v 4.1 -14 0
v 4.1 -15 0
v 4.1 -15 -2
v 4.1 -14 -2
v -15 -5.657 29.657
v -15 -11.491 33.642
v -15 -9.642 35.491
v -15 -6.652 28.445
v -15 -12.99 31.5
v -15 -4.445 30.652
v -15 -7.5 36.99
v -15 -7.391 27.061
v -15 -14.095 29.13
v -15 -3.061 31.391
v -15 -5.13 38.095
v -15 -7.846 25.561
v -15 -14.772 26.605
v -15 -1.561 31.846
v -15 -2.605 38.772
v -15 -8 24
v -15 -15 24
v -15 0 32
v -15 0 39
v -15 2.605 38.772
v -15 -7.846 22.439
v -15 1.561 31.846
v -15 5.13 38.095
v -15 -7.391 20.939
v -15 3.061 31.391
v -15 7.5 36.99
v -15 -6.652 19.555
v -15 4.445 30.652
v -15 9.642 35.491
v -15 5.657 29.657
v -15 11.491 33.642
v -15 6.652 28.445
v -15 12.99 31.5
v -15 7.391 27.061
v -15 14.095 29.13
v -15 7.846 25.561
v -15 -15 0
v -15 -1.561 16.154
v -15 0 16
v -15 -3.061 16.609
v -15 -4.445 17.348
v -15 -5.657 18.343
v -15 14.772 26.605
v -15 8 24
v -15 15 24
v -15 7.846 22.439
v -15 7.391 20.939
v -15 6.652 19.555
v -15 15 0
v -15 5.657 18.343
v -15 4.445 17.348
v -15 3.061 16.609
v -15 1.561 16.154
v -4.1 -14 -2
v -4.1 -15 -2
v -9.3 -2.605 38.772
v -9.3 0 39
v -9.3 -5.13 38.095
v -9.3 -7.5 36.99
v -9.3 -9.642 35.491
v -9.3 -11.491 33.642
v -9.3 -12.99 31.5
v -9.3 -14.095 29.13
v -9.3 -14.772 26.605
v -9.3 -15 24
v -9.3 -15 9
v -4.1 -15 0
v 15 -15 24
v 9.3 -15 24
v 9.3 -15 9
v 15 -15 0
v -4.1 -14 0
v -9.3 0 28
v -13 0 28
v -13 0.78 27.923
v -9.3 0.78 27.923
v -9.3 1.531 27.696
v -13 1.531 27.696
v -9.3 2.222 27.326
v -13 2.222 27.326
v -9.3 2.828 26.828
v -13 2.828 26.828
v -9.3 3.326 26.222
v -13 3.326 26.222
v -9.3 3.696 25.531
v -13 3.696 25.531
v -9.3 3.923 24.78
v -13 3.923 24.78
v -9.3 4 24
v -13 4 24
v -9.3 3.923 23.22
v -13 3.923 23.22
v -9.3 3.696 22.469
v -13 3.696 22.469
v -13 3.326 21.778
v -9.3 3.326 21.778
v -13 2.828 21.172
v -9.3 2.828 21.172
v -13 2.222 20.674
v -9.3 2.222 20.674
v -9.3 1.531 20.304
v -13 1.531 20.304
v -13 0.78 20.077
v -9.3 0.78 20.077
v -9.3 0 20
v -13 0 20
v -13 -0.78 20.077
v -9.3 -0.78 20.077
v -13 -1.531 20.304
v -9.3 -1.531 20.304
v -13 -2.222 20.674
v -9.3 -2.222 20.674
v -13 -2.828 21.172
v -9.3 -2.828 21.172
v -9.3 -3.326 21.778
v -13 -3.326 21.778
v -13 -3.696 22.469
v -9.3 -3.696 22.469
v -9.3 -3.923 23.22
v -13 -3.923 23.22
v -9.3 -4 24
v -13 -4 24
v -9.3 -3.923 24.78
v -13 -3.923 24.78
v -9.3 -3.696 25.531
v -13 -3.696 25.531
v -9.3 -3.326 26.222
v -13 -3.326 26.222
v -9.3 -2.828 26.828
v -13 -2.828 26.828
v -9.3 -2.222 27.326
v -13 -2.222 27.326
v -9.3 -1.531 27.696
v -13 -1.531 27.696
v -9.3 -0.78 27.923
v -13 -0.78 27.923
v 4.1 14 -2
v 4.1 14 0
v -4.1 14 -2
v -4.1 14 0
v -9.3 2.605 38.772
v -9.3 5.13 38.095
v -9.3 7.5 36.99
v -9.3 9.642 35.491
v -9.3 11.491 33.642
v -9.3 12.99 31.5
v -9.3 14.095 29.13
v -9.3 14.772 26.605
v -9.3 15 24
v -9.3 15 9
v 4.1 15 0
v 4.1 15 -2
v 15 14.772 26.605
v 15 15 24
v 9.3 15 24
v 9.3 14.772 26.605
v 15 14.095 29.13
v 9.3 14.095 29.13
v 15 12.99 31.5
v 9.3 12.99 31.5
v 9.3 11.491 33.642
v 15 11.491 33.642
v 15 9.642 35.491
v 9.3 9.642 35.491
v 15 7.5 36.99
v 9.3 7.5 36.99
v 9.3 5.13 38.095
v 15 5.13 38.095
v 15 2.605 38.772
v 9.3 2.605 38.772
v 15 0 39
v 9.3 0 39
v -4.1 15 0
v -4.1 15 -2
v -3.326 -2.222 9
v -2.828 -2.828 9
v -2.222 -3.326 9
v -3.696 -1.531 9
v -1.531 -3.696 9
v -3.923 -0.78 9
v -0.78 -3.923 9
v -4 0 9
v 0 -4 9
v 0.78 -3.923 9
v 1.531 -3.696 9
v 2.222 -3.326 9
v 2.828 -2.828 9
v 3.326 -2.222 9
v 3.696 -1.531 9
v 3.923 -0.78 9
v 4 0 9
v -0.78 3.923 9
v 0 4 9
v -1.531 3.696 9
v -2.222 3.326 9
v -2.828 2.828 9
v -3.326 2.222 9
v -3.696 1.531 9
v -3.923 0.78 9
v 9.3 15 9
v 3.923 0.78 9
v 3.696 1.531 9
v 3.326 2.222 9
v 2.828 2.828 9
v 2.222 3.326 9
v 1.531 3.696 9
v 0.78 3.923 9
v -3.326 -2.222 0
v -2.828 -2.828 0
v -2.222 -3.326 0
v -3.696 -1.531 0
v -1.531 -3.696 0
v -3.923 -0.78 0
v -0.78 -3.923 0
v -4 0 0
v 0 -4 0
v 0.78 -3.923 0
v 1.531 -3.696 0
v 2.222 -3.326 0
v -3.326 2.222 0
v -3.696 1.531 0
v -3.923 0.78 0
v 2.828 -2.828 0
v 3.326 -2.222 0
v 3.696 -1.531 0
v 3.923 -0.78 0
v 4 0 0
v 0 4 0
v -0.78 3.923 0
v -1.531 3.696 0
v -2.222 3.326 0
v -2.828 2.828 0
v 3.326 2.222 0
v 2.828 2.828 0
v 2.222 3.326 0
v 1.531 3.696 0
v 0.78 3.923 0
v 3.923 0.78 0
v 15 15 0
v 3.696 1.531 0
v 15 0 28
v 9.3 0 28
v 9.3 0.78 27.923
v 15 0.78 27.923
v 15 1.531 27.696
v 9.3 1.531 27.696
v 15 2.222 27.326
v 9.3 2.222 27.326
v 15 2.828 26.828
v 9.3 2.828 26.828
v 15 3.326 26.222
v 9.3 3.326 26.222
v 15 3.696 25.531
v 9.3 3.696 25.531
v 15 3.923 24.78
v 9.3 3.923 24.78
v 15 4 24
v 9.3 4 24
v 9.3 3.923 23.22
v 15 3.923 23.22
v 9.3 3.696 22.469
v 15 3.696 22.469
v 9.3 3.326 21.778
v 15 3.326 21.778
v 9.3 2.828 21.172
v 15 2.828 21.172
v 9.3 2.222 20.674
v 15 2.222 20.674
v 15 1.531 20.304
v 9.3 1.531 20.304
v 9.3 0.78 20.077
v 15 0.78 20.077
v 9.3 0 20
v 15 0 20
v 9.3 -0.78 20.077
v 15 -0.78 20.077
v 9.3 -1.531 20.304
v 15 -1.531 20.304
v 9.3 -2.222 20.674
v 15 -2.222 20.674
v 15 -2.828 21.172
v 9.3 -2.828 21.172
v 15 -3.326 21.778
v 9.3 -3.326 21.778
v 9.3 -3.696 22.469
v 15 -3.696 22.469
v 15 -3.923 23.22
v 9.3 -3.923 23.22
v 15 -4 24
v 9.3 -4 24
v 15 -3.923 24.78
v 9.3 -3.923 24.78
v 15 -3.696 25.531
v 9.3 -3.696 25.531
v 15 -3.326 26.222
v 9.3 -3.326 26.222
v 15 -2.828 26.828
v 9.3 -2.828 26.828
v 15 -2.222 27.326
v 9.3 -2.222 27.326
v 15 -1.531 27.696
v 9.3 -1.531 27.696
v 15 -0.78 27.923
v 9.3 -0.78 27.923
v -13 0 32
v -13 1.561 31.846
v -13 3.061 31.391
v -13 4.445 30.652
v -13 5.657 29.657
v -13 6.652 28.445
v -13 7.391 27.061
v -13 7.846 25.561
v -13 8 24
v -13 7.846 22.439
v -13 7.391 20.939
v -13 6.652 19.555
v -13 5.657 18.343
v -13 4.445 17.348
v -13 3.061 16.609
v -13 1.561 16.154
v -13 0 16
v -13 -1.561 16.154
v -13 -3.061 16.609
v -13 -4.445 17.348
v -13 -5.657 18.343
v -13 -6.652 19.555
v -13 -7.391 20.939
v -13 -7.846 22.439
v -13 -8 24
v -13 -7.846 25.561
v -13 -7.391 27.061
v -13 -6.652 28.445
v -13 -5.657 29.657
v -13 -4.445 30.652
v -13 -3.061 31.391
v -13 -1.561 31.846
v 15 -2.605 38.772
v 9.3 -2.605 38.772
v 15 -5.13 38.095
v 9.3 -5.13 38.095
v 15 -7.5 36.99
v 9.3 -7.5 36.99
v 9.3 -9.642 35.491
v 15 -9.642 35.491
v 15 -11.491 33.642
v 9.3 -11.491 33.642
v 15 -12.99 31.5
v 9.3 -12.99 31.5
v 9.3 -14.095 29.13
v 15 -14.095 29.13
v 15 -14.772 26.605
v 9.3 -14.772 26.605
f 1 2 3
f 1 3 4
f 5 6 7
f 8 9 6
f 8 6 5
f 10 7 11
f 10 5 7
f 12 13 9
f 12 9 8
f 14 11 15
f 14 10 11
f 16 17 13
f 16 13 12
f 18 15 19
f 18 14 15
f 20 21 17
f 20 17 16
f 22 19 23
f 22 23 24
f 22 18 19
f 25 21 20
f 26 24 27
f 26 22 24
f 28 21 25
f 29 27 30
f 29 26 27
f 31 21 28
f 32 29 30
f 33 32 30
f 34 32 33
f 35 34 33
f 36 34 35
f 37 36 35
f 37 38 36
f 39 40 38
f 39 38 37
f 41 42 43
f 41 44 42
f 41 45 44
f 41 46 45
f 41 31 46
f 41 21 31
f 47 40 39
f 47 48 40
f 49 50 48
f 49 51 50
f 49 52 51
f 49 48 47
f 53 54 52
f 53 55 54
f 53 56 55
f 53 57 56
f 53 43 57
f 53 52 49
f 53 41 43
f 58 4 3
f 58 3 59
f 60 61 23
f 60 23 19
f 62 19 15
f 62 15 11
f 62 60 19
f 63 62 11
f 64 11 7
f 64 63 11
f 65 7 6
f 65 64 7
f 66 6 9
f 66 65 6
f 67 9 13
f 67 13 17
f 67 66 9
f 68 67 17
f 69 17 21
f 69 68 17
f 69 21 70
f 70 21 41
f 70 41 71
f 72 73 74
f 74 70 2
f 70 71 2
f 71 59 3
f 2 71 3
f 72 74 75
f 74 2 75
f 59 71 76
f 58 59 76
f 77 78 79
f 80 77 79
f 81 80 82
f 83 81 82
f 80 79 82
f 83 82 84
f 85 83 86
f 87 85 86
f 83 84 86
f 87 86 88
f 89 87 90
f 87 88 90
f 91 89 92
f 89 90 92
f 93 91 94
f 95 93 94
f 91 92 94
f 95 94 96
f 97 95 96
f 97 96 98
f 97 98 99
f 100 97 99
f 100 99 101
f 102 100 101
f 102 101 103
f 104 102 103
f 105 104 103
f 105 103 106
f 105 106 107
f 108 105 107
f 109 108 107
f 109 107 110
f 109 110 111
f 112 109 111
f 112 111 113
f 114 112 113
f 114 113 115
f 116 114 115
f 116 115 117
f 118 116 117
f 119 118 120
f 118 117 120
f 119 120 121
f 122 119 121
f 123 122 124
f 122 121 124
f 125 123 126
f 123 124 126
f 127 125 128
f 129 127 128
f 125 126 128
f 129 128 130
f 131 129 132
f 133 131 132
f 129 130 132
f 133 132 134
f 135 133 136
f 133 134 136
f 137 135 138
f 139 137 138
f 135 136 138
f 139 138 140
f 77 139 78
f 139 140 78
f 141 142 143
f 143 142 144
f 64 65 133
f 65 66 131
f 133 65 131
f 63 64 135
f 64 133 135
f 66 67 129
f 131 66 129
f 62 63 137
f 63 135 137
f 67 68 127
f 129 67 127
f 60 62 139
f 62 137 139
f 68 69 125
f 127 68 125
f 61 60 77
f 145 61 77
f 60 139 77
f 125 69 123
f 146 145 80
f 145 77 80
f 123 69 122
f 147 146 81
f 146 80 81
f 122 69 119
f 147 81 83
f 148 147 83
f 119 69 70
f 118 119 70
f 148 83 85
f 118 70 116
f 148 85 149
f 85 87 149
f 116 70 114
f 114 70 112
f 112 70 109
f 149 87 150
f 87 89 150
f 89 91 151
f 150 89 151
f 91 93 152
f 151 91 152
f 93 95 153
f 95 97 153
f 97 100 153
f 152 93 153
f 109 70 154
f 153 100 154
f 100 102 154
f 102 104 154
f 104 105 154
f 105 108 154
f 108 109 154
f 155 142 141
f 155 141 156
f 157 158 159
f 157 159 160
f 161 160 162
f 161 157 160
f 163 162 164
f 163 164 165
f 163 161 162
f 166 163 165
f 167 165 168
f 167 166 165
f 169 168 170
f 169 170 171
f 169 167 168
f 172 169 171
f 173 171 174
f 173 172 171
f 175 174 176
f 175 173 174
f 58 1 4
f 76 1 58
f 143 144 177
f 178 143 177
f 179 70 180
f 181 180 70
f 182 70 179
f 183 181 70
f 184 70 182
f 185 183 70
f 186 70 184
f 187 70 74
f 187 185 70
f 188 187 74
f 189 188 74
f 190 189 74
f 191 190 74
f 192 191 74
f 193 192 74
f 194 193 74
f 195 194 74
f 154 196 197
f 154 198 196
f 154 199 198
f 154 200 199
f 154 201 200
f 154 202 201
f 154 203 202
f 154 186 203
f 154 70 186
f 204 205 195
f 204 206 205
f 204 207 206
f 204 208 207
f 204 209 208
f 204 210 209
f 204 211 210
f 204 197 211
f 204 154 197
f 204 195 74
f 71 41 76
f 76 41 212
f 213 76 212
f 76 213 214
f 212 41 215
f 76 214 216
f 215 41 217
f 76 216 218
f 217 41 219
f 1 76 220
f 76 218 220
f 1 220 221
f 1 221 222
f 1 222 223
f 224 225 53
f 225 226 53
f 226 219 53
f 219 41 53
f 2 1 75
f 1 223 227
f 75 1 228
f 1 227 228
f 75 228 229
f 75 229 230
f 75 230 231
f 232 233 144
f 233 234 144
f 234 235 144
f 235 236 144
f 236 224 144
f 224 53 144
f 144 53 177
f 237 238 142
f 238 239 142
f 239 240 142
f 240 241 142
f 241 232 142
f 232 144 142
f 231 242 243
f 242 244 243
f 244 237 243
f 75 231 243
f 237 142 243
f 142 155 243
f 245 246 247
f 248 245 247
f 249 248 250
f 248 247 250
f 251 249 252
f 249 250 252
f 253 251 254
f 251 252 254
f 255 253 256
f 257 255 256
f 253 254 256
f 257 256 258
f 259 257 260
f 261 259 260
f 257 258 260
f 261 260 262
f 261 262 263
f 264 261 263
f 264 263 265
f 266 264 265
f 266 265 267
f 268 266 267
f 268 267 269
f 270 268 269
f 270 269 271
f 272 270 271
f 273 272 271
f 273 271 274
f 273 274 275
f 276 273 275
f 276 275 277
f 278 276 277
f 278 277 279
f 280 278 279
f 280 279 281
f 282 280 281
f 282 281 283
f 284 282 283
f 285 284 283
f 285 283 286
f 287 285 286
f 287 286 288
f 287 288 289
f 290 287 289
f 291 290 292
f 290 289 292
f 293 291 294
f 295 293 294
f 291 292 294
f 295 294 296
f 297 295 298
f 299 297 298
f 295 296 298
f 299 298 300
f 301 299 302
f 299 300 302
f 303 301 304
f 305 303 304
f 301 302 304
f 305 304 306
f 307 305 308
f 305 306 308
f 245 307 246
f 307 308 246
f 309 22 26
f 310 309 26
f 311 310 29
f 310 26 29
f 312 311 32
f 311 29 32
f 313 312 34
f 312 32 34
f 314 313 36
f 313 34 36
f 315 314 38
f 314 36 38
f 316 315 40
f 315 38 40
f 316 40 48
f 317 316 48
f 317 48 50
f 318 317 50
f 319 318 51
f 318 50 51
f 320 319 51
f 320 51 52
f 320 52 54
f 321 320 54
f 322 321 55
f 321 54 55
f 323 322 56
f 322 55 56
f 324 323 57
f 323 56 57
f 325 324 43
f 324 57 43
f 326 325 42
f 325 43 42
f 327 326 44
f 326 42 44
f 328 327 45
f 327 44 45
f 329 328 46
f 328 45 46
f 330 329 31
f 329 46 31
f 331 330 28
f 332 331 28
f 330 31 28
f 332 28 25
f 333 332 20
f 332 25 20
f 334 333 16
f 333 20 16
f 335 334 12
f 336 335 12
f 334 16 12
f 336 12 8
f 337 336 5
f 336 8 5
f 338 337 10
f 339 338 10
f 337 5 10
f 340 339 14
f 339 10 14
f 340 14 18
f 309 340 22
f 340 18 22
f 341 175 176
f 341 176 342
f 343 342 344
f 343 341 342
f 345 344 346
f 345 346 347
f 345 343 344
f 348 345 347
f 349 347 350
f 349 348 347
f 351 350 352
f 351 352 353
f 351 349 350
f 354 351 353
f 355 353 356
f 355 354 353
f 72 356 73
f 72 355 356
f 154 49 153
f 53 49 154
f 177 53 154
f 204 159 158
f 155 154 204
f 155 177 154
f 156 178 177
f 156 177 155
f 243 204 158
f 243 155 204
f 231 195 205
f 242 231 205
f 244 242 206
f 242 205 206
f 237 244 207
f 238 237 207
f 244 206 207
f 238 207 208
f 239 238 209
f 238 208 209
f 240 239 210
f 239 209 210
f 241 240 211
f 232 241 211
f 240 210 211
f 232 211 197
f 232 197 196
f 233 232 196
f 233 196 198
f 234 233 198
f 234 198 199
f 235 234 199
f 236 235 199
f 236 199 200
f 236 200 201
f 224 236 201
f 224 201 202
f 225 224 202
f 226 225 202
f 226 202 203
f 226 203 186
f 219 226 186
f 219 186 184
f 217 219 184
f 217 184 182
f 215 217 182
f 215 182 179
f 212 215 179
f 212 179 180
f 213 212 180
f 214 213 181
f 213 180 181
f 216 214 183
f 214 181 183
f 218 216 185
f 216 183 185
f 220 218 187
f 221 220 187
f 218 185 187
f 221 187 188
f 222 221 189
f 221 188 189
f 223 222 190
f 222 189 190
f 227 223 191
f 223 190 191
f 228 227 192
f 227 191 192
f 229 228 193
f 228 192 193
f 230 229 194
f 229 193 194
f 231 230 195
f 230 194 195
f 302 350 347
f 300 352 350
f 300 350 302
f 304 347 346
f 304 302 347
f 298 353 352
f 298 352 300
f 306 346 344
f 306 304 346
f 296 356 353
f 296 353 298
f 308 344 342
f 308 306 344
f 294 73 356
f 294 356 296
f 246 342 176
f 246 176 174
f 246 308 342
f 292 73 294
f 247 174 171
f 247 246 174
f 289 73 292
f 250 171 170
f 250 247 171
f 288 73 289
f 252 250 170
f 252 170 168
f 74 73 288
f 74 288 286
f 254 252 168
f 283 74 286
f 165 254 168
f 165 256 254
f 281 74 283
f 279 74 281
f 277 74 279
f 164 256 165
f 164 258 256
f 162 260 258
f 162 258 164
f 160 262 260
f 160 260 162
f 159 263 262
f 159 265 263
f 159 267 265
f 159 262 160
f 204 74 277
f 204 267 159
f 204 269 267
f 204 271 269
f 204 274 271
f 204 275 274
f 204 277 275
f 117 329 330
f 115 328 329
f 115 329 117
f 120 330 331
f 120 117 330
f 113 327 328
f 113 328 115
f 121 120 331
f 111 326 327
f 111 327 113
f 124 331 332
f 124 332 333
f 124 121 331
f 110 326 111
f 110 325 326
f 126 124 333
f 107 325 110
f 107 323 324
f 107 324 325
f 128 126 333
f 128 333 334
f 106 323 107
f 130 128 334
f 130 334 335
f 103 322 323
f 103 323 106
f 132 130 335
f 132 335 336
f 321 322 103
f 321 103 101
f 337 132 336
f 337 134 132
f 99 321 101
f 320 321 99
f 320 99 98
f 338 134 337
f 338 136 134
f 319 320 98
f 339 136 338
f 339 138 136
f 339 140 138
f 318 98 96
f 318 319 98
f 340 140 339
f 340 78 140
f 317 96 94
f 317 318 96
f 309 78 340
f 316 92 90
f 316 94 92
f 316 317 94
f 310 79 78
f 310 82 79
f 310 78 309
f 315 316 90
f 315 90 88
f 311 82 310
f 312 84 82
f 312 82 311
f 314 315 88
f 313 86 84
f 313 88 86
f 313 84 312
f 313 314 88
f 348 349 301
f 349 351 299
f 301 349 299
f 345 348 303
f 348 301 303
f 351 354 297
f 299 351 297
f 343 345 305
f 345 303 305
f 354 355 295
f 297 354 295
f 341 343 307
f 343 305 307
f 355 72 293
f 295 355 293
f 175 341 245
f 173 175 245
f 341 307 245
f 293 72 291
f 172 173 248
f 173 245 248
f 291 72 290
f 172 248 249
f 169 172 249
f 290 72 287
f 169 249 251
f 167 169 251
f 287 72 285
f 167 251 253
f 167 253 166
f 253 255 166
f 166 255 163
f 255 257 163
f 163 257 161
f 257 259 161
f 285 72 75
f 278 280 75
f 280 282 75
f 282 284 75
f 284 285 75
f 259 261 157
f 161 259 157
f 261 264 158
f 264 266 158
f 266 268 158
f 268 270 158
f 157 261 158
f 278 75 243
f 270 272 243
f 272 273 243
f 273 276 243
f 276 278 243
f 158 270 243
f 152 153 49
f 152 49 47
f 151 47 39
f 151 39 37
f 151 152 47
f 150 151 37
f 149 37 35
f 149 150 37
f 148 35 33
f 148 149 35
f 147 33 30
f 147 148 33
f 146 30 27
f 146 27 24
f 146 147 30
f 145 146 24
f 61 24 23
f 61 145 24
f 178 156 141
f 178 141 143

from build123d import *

# Parameters (mm, degrees)
SKETCH_1_W          = 30
SKETCH_1_H          = 30
EXTRUDE_1_DEPTH     = 9
SKETCH_2_W          = 5.7
SKETCH_2_H          = 30
EXTRUDE_2_DEPTH     = 30
CUT_EXTRUDE_START   = -30
CUT_EXTRUDE_2_DEPTH = 30
SKETCH_4_R          = 4
CUT_EXTRUDE_3_DEPTH = 52.439284598
SKETCH_5_R          = 8
CUT_EXTRUDE_4_DEPTH = 2
SKETCH_6_R          = 4
CUT_EXTRUDE_5_DEPTH = 37.742346142
SKETCH_7_W          = 8.2
SKETCH_7_H          = 1
EXTRUDE_3_DEPTH     = 2


# Read off the part's stored shape, not the designer's step: 切除-拉伸2
with BuildPart() as part:
    # 草图1 → 凸台-拉伸1 (new body)
    with BuildSketch(Plane.XY):
        Rectangle(SKETCH_1_W, SKETCH_1_H)
    extrude(amount=EXTRUDE_1_DEPTH)

    # 草图2 → 凸台-拉伸2 (add)
    with BuildSketch(Plane.XY.offset(9)):
        with Locations((-12.15, 0)):
            Rectangle(SKETCH_2_W, SKETCH_2_H)
        with Locations((12.15, 0)):
            Rectangle(SKETCH_2_W, SKETCH_2_H)
    extrude(amount=EXTRUDE_2_DEPTH)

    # 切除-拉伸2 outline → 切除-拉伸2 (cut)
    with BuildSketch(Plane.ZY.offset(15).offset(CUT_EXTRUDE_START)):
        with BuildLine():
            Line((39, 15), (24, 15))
            ThreePointArc((24, 15), (34.606601718, 10.606601718), (39, 0))
            Line((39, 0), (39, 15))
        make_face()
        with BuildLine():
            Line((39, -15), (39, 0))
            ThreePointArc((39, 0), (34.606601718, -10.606601718), (24, -15))
            Line((24, -15), (39, -15))
        make_face()
    extrude(amount=CUT_EXTRUDE_2_DEPTH, mode=Mode.SUBTRACT)

    # 草图4 → 切除-拉伸3 (cut, through all)
    with BuildSketch(Plane.ZY.offset(15)):
        with Locations((24, 0)):
            Circle(SKETCH_4_R)
    extrude(amount=-CUT_EXTRUDE_3_DEPTH, mode=Mode.SUBTRACT)

    # 草图5 → 切除-拉伸4 (cut)
    with BuildSketch(Plane.ZY.offset(15)):
        with Locations((24, 0)):
            Circle(SKETCH_5_R)
    extrude(amount=-CUT_EXTRUDE_4_DEPTH, mode=Mode.SUBTRACT)

    # 草图6 → 切除-拉伸5 (cut, through all)
    with BuildSketch(Plane.XY.offset(9)):
        Circle(SKETCH_6_R)
    extrude(amount=-CUT_EXTRUDE_5_DEPTH, mode=Mode.SUBTRACT)

    # 草图7 → 凸台-拉伸3 (add)
    with BuildSketch(Plane(origin=(0, 0, 0), x_dir=(-1, 0, 0), z_dir=(0, 0, -1))):
        with Locations((0, 14.5)):
            Rectangle(SKETCH_7_W, SKETCH_7_H)
        with Locations((0, -14.5)):
            Rectangle(SKETCH_7_W, SKETCH_7_H)
    extrude(amount=EXTRUDE_3_DEPTH)


solid = part.part
